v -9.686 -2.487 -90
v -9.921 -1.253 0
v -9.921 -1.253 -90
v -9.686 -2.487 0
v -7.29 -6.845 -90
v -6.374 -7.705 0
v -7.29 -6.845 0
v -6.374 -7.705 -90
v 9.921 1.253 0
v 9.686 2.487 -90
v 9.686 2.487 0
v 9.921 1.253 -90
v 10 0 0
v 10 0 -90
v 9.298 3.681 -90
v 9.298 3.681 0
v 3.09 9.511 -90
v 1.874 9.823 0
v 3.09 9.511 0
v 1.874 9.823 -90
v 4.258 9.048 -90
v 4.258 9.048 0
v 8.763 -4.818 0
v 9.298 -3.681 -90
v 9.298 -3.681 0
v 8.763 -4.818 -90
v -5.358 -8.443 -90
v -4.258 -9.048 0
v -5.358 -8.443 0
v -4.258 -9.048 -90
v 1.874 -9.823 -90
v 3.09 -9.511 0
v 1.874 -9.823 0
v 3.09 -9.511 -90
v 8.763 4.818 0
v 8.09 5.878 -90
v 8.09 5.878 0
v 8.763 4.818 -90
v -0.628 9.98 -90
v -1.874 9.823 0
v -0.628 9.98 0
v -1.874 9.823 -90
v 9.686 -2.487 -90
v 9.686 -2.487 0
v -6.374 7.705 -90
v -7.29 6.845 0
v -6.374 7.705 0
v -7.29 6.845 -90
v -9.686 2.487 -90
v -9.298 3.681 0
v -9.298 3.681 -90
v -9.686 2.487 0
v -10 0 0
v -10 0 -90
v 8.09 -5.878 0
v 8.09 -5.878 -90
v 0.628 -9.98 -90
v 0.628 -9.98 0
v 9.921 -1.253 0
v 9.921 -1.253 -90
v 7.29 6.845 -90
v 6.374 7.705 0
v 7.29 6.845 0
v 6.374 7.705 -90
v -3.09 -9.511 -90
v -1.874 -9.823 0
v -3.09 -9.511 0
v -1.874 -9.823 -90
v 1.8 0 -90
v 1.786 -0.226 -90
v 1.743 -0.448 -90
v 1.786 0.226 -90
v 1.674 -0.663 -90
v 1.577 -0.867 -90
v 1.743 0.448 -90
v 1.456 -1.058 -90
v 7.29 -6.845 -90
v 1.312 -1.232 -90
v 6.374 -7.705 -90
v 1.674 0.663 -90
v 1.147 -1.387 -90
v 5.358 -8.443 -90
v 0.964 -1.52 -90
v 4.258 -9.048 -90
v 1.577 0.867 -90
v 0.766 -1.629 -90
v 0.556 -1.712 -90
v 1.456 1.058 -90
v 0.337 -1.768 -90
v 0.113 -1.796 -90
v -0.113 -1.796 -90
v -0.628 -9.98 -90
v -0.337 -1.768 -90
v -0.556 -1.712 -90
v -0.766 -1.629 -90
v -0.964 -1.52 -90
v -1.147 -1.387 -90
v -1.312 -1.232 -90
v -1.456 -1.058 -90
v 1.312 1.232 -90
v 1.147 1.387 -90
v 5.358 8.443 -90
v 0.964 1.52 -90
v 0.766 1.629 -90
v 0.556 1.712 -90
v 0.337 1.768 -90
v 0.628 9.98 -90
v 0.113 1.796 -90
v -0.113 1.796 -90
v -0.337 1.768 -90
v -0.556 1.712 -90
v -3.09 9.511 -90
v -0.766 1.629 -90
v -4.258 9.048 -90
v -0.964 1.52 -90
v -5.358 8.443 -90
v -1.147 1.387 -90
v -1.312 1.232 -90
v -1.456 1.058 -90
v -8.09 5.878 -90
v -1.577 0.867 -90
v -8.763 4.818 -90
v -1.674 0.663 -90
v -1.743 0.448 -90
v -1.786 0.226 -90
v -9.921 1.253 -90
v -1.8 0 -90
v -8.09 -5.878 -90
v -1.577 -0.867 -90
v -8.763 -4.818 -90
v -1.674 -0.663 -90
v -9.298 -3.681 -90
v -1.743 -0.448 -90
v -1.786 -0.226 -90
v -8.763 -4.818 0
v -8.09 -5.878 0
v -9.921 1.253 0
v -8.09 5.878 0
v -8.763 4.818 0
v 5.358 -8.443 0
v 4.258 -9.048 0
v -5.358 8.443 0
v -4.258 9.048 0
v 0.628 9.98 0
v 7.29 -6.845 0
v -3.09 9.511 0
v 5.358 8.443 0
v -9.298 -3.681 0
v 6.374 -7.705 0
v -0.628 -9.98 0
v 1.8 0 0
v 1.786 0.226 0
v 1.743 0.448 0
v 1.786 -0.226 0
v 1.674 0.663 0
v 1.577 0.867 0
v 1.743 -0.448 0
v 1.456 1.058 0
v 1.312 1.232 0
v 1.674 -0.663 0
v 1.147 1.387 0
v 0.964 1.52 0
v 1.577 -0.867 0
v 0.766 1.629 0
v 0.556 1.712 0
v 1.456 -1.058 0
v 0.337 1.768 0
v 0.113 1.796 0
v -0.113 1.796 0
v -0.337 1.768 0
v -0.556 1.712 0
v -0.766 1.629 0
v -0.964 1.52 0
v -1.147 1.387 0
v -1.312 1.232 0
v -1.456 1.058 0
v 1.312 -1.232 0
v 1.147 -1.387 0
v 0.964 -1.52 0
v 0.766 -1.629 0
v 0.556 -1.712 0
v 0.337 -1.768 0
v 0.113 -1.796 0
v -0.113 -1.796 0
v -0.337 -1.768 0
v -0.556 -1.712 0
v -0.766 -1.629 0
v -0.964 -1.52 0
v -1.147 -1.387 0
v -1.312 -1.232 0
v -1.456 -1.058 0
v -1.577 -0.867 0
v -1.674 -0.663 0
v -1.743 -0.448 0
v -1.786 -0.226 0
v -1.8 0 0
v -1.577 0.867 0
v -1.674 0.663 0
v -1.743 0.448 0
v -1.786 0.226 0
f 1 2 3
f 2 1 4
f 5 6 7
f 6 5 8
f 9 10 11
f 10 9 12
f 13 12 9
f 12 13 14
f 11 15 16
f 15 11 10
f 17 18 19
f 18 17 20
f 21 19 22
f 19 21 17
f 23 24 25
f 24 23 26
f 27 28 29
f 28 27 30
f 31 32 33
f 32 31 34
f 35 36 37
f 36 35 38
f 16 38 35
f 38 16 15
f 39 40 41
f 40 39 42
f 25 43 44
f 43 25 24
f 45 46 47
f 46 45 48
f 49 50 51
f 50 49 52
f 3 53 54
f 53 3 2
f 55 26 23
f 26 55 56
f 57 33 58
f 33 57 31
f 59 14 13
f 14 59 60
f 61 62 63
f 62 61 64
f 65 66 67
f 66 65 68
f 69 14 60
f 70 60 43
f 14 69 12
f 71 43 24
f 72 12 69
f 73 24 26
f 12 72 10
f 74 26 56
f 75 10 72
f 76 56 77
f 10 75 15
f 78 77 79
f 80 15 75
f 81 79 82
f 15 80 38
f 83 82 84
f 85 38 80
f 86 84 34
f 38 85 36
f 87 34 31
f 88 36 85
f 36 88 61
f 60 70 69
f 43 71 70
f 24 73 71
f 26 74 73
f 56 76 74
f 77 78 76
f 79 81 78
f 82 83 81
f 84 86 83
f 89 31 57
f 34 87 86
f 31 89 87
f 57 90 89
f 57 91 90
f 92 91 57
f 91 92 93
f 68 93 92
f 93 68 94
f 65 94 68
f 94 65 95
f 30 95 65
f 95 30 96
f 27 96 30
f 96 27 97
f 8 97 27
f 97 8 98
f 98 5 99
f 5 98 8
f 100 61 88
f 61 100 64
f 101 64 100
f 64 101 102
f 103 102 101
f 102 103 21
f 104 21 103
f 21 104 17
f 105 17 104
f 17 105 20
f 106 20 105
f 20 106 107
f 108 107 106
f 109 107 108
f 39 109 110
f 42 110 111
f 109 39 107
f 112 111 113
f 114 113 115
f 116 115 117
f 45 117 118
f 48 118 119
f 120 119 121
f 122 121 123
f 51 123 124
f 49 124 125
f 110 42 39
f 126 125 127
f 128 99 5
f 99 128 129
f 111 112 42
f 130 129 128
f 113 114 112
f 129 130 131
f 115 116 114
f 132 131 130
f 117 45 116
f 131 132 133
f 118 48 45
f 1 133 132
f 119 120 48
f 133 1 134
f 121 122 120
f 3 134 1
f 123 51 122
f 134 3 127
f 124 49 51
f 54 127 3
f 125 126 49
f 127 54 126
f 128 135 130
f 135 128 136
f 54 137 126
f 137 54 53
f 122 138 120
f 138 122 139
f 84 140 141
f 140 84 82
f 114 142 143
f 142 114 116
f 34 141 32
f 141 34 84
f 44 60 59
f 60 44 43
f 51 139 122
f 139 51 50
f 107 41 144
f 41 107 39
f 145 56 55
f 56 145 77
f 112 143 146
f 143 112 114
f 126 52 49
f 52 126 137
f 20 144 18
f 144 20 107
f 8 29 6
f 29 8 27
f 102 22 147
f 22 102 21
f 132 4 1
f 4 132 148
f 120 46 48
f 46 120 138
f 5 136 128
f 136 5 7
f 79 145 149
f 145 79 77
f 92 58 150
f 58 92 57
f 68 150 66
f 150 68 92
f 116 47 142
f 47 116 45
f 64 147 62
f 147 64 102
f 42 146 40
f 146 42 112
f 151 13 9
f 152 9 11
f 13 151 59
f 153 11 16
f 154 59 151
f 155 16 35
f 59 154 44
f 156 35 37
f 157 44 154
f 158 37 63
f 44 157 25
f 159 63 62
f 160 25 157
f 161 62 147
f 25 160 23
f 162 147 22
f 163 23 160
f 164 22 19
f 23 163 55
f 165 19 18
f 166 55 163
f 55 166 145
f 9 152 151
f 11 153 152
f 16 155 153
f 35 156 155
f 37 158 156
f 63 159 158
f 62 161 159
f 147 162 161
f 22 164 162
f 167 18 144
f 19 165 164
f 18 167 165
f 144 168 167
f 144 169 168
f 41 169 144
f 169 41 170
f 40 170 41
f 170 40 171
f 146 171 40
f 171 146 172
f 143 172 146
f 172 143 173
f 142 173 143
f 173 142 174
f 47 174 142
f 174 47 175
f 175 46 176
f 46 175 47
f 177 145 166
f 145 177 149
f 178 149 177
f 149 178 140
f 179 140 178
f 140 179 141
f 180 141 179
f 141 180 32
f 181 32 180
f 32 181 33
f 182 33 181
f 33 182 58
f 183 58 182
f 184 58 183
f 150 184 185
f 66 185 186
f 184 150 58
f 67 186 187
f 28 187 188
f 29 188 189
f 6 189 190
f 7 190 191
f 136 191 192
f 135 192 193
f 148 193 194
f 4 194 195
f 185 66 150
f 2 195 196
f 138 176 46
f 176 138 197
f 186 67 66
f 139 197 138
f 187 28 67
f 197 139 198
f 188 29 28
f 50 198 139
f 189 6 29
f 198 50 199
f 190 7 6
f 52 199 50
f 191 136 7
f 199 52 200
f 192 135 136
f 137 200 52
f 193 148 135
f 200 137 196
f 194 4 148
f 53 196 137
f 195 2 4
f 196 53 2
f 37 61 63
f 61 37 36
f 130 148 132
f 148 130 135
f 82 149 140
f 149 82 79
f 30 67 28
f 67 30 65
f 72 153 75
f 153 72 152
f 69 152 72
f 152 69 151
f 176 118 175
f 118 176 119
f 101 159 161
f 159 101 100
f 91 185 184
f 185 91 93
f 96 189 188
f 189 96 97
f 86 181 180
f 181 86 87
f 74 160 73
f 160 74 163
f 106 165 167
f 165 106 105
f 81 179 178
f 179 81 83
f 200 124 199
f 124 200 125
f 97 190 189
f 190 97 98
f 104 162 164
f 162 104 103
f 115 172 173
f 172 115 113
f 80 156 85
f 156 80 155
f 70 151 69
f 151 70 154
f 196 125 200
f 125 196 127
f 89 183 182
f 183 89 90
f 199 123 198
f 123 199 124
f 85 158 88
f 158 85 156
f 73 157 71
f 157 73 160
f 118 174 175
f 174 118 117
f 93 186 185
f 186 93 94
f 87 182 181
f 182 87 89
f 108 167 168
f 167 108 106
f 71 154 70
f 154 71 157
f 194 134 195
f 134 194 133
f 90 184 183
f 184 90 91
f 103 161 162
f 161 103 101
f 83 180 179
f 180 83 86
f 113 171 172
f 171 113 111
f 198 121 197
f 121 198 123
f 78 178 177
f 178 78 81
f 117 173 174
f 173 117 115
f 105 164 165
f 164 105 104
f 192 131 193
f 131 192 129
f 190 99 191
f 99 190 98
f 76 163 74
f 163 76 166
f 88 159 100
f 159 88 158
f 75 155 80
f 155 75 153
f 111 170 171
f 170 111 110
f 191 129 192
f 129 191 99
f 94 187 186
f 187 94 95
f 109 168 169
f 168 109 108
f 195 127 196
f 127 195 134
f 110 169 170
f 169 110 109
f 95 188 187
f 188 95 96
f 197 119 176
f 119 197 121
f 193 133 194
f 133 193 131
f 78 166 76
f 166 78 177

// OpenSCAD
$fn = 50;


difference() {
	union() {
		translate(v = [0, 0, -90.0000000000]) {
			cylinder(h = 90, r = 10.0000000000);
		}
	}
	union() {
		#translate(v = [0, 0, -90]) {
			cylinder(h = 90, r = 1.8000000000);
		}
	}
}
